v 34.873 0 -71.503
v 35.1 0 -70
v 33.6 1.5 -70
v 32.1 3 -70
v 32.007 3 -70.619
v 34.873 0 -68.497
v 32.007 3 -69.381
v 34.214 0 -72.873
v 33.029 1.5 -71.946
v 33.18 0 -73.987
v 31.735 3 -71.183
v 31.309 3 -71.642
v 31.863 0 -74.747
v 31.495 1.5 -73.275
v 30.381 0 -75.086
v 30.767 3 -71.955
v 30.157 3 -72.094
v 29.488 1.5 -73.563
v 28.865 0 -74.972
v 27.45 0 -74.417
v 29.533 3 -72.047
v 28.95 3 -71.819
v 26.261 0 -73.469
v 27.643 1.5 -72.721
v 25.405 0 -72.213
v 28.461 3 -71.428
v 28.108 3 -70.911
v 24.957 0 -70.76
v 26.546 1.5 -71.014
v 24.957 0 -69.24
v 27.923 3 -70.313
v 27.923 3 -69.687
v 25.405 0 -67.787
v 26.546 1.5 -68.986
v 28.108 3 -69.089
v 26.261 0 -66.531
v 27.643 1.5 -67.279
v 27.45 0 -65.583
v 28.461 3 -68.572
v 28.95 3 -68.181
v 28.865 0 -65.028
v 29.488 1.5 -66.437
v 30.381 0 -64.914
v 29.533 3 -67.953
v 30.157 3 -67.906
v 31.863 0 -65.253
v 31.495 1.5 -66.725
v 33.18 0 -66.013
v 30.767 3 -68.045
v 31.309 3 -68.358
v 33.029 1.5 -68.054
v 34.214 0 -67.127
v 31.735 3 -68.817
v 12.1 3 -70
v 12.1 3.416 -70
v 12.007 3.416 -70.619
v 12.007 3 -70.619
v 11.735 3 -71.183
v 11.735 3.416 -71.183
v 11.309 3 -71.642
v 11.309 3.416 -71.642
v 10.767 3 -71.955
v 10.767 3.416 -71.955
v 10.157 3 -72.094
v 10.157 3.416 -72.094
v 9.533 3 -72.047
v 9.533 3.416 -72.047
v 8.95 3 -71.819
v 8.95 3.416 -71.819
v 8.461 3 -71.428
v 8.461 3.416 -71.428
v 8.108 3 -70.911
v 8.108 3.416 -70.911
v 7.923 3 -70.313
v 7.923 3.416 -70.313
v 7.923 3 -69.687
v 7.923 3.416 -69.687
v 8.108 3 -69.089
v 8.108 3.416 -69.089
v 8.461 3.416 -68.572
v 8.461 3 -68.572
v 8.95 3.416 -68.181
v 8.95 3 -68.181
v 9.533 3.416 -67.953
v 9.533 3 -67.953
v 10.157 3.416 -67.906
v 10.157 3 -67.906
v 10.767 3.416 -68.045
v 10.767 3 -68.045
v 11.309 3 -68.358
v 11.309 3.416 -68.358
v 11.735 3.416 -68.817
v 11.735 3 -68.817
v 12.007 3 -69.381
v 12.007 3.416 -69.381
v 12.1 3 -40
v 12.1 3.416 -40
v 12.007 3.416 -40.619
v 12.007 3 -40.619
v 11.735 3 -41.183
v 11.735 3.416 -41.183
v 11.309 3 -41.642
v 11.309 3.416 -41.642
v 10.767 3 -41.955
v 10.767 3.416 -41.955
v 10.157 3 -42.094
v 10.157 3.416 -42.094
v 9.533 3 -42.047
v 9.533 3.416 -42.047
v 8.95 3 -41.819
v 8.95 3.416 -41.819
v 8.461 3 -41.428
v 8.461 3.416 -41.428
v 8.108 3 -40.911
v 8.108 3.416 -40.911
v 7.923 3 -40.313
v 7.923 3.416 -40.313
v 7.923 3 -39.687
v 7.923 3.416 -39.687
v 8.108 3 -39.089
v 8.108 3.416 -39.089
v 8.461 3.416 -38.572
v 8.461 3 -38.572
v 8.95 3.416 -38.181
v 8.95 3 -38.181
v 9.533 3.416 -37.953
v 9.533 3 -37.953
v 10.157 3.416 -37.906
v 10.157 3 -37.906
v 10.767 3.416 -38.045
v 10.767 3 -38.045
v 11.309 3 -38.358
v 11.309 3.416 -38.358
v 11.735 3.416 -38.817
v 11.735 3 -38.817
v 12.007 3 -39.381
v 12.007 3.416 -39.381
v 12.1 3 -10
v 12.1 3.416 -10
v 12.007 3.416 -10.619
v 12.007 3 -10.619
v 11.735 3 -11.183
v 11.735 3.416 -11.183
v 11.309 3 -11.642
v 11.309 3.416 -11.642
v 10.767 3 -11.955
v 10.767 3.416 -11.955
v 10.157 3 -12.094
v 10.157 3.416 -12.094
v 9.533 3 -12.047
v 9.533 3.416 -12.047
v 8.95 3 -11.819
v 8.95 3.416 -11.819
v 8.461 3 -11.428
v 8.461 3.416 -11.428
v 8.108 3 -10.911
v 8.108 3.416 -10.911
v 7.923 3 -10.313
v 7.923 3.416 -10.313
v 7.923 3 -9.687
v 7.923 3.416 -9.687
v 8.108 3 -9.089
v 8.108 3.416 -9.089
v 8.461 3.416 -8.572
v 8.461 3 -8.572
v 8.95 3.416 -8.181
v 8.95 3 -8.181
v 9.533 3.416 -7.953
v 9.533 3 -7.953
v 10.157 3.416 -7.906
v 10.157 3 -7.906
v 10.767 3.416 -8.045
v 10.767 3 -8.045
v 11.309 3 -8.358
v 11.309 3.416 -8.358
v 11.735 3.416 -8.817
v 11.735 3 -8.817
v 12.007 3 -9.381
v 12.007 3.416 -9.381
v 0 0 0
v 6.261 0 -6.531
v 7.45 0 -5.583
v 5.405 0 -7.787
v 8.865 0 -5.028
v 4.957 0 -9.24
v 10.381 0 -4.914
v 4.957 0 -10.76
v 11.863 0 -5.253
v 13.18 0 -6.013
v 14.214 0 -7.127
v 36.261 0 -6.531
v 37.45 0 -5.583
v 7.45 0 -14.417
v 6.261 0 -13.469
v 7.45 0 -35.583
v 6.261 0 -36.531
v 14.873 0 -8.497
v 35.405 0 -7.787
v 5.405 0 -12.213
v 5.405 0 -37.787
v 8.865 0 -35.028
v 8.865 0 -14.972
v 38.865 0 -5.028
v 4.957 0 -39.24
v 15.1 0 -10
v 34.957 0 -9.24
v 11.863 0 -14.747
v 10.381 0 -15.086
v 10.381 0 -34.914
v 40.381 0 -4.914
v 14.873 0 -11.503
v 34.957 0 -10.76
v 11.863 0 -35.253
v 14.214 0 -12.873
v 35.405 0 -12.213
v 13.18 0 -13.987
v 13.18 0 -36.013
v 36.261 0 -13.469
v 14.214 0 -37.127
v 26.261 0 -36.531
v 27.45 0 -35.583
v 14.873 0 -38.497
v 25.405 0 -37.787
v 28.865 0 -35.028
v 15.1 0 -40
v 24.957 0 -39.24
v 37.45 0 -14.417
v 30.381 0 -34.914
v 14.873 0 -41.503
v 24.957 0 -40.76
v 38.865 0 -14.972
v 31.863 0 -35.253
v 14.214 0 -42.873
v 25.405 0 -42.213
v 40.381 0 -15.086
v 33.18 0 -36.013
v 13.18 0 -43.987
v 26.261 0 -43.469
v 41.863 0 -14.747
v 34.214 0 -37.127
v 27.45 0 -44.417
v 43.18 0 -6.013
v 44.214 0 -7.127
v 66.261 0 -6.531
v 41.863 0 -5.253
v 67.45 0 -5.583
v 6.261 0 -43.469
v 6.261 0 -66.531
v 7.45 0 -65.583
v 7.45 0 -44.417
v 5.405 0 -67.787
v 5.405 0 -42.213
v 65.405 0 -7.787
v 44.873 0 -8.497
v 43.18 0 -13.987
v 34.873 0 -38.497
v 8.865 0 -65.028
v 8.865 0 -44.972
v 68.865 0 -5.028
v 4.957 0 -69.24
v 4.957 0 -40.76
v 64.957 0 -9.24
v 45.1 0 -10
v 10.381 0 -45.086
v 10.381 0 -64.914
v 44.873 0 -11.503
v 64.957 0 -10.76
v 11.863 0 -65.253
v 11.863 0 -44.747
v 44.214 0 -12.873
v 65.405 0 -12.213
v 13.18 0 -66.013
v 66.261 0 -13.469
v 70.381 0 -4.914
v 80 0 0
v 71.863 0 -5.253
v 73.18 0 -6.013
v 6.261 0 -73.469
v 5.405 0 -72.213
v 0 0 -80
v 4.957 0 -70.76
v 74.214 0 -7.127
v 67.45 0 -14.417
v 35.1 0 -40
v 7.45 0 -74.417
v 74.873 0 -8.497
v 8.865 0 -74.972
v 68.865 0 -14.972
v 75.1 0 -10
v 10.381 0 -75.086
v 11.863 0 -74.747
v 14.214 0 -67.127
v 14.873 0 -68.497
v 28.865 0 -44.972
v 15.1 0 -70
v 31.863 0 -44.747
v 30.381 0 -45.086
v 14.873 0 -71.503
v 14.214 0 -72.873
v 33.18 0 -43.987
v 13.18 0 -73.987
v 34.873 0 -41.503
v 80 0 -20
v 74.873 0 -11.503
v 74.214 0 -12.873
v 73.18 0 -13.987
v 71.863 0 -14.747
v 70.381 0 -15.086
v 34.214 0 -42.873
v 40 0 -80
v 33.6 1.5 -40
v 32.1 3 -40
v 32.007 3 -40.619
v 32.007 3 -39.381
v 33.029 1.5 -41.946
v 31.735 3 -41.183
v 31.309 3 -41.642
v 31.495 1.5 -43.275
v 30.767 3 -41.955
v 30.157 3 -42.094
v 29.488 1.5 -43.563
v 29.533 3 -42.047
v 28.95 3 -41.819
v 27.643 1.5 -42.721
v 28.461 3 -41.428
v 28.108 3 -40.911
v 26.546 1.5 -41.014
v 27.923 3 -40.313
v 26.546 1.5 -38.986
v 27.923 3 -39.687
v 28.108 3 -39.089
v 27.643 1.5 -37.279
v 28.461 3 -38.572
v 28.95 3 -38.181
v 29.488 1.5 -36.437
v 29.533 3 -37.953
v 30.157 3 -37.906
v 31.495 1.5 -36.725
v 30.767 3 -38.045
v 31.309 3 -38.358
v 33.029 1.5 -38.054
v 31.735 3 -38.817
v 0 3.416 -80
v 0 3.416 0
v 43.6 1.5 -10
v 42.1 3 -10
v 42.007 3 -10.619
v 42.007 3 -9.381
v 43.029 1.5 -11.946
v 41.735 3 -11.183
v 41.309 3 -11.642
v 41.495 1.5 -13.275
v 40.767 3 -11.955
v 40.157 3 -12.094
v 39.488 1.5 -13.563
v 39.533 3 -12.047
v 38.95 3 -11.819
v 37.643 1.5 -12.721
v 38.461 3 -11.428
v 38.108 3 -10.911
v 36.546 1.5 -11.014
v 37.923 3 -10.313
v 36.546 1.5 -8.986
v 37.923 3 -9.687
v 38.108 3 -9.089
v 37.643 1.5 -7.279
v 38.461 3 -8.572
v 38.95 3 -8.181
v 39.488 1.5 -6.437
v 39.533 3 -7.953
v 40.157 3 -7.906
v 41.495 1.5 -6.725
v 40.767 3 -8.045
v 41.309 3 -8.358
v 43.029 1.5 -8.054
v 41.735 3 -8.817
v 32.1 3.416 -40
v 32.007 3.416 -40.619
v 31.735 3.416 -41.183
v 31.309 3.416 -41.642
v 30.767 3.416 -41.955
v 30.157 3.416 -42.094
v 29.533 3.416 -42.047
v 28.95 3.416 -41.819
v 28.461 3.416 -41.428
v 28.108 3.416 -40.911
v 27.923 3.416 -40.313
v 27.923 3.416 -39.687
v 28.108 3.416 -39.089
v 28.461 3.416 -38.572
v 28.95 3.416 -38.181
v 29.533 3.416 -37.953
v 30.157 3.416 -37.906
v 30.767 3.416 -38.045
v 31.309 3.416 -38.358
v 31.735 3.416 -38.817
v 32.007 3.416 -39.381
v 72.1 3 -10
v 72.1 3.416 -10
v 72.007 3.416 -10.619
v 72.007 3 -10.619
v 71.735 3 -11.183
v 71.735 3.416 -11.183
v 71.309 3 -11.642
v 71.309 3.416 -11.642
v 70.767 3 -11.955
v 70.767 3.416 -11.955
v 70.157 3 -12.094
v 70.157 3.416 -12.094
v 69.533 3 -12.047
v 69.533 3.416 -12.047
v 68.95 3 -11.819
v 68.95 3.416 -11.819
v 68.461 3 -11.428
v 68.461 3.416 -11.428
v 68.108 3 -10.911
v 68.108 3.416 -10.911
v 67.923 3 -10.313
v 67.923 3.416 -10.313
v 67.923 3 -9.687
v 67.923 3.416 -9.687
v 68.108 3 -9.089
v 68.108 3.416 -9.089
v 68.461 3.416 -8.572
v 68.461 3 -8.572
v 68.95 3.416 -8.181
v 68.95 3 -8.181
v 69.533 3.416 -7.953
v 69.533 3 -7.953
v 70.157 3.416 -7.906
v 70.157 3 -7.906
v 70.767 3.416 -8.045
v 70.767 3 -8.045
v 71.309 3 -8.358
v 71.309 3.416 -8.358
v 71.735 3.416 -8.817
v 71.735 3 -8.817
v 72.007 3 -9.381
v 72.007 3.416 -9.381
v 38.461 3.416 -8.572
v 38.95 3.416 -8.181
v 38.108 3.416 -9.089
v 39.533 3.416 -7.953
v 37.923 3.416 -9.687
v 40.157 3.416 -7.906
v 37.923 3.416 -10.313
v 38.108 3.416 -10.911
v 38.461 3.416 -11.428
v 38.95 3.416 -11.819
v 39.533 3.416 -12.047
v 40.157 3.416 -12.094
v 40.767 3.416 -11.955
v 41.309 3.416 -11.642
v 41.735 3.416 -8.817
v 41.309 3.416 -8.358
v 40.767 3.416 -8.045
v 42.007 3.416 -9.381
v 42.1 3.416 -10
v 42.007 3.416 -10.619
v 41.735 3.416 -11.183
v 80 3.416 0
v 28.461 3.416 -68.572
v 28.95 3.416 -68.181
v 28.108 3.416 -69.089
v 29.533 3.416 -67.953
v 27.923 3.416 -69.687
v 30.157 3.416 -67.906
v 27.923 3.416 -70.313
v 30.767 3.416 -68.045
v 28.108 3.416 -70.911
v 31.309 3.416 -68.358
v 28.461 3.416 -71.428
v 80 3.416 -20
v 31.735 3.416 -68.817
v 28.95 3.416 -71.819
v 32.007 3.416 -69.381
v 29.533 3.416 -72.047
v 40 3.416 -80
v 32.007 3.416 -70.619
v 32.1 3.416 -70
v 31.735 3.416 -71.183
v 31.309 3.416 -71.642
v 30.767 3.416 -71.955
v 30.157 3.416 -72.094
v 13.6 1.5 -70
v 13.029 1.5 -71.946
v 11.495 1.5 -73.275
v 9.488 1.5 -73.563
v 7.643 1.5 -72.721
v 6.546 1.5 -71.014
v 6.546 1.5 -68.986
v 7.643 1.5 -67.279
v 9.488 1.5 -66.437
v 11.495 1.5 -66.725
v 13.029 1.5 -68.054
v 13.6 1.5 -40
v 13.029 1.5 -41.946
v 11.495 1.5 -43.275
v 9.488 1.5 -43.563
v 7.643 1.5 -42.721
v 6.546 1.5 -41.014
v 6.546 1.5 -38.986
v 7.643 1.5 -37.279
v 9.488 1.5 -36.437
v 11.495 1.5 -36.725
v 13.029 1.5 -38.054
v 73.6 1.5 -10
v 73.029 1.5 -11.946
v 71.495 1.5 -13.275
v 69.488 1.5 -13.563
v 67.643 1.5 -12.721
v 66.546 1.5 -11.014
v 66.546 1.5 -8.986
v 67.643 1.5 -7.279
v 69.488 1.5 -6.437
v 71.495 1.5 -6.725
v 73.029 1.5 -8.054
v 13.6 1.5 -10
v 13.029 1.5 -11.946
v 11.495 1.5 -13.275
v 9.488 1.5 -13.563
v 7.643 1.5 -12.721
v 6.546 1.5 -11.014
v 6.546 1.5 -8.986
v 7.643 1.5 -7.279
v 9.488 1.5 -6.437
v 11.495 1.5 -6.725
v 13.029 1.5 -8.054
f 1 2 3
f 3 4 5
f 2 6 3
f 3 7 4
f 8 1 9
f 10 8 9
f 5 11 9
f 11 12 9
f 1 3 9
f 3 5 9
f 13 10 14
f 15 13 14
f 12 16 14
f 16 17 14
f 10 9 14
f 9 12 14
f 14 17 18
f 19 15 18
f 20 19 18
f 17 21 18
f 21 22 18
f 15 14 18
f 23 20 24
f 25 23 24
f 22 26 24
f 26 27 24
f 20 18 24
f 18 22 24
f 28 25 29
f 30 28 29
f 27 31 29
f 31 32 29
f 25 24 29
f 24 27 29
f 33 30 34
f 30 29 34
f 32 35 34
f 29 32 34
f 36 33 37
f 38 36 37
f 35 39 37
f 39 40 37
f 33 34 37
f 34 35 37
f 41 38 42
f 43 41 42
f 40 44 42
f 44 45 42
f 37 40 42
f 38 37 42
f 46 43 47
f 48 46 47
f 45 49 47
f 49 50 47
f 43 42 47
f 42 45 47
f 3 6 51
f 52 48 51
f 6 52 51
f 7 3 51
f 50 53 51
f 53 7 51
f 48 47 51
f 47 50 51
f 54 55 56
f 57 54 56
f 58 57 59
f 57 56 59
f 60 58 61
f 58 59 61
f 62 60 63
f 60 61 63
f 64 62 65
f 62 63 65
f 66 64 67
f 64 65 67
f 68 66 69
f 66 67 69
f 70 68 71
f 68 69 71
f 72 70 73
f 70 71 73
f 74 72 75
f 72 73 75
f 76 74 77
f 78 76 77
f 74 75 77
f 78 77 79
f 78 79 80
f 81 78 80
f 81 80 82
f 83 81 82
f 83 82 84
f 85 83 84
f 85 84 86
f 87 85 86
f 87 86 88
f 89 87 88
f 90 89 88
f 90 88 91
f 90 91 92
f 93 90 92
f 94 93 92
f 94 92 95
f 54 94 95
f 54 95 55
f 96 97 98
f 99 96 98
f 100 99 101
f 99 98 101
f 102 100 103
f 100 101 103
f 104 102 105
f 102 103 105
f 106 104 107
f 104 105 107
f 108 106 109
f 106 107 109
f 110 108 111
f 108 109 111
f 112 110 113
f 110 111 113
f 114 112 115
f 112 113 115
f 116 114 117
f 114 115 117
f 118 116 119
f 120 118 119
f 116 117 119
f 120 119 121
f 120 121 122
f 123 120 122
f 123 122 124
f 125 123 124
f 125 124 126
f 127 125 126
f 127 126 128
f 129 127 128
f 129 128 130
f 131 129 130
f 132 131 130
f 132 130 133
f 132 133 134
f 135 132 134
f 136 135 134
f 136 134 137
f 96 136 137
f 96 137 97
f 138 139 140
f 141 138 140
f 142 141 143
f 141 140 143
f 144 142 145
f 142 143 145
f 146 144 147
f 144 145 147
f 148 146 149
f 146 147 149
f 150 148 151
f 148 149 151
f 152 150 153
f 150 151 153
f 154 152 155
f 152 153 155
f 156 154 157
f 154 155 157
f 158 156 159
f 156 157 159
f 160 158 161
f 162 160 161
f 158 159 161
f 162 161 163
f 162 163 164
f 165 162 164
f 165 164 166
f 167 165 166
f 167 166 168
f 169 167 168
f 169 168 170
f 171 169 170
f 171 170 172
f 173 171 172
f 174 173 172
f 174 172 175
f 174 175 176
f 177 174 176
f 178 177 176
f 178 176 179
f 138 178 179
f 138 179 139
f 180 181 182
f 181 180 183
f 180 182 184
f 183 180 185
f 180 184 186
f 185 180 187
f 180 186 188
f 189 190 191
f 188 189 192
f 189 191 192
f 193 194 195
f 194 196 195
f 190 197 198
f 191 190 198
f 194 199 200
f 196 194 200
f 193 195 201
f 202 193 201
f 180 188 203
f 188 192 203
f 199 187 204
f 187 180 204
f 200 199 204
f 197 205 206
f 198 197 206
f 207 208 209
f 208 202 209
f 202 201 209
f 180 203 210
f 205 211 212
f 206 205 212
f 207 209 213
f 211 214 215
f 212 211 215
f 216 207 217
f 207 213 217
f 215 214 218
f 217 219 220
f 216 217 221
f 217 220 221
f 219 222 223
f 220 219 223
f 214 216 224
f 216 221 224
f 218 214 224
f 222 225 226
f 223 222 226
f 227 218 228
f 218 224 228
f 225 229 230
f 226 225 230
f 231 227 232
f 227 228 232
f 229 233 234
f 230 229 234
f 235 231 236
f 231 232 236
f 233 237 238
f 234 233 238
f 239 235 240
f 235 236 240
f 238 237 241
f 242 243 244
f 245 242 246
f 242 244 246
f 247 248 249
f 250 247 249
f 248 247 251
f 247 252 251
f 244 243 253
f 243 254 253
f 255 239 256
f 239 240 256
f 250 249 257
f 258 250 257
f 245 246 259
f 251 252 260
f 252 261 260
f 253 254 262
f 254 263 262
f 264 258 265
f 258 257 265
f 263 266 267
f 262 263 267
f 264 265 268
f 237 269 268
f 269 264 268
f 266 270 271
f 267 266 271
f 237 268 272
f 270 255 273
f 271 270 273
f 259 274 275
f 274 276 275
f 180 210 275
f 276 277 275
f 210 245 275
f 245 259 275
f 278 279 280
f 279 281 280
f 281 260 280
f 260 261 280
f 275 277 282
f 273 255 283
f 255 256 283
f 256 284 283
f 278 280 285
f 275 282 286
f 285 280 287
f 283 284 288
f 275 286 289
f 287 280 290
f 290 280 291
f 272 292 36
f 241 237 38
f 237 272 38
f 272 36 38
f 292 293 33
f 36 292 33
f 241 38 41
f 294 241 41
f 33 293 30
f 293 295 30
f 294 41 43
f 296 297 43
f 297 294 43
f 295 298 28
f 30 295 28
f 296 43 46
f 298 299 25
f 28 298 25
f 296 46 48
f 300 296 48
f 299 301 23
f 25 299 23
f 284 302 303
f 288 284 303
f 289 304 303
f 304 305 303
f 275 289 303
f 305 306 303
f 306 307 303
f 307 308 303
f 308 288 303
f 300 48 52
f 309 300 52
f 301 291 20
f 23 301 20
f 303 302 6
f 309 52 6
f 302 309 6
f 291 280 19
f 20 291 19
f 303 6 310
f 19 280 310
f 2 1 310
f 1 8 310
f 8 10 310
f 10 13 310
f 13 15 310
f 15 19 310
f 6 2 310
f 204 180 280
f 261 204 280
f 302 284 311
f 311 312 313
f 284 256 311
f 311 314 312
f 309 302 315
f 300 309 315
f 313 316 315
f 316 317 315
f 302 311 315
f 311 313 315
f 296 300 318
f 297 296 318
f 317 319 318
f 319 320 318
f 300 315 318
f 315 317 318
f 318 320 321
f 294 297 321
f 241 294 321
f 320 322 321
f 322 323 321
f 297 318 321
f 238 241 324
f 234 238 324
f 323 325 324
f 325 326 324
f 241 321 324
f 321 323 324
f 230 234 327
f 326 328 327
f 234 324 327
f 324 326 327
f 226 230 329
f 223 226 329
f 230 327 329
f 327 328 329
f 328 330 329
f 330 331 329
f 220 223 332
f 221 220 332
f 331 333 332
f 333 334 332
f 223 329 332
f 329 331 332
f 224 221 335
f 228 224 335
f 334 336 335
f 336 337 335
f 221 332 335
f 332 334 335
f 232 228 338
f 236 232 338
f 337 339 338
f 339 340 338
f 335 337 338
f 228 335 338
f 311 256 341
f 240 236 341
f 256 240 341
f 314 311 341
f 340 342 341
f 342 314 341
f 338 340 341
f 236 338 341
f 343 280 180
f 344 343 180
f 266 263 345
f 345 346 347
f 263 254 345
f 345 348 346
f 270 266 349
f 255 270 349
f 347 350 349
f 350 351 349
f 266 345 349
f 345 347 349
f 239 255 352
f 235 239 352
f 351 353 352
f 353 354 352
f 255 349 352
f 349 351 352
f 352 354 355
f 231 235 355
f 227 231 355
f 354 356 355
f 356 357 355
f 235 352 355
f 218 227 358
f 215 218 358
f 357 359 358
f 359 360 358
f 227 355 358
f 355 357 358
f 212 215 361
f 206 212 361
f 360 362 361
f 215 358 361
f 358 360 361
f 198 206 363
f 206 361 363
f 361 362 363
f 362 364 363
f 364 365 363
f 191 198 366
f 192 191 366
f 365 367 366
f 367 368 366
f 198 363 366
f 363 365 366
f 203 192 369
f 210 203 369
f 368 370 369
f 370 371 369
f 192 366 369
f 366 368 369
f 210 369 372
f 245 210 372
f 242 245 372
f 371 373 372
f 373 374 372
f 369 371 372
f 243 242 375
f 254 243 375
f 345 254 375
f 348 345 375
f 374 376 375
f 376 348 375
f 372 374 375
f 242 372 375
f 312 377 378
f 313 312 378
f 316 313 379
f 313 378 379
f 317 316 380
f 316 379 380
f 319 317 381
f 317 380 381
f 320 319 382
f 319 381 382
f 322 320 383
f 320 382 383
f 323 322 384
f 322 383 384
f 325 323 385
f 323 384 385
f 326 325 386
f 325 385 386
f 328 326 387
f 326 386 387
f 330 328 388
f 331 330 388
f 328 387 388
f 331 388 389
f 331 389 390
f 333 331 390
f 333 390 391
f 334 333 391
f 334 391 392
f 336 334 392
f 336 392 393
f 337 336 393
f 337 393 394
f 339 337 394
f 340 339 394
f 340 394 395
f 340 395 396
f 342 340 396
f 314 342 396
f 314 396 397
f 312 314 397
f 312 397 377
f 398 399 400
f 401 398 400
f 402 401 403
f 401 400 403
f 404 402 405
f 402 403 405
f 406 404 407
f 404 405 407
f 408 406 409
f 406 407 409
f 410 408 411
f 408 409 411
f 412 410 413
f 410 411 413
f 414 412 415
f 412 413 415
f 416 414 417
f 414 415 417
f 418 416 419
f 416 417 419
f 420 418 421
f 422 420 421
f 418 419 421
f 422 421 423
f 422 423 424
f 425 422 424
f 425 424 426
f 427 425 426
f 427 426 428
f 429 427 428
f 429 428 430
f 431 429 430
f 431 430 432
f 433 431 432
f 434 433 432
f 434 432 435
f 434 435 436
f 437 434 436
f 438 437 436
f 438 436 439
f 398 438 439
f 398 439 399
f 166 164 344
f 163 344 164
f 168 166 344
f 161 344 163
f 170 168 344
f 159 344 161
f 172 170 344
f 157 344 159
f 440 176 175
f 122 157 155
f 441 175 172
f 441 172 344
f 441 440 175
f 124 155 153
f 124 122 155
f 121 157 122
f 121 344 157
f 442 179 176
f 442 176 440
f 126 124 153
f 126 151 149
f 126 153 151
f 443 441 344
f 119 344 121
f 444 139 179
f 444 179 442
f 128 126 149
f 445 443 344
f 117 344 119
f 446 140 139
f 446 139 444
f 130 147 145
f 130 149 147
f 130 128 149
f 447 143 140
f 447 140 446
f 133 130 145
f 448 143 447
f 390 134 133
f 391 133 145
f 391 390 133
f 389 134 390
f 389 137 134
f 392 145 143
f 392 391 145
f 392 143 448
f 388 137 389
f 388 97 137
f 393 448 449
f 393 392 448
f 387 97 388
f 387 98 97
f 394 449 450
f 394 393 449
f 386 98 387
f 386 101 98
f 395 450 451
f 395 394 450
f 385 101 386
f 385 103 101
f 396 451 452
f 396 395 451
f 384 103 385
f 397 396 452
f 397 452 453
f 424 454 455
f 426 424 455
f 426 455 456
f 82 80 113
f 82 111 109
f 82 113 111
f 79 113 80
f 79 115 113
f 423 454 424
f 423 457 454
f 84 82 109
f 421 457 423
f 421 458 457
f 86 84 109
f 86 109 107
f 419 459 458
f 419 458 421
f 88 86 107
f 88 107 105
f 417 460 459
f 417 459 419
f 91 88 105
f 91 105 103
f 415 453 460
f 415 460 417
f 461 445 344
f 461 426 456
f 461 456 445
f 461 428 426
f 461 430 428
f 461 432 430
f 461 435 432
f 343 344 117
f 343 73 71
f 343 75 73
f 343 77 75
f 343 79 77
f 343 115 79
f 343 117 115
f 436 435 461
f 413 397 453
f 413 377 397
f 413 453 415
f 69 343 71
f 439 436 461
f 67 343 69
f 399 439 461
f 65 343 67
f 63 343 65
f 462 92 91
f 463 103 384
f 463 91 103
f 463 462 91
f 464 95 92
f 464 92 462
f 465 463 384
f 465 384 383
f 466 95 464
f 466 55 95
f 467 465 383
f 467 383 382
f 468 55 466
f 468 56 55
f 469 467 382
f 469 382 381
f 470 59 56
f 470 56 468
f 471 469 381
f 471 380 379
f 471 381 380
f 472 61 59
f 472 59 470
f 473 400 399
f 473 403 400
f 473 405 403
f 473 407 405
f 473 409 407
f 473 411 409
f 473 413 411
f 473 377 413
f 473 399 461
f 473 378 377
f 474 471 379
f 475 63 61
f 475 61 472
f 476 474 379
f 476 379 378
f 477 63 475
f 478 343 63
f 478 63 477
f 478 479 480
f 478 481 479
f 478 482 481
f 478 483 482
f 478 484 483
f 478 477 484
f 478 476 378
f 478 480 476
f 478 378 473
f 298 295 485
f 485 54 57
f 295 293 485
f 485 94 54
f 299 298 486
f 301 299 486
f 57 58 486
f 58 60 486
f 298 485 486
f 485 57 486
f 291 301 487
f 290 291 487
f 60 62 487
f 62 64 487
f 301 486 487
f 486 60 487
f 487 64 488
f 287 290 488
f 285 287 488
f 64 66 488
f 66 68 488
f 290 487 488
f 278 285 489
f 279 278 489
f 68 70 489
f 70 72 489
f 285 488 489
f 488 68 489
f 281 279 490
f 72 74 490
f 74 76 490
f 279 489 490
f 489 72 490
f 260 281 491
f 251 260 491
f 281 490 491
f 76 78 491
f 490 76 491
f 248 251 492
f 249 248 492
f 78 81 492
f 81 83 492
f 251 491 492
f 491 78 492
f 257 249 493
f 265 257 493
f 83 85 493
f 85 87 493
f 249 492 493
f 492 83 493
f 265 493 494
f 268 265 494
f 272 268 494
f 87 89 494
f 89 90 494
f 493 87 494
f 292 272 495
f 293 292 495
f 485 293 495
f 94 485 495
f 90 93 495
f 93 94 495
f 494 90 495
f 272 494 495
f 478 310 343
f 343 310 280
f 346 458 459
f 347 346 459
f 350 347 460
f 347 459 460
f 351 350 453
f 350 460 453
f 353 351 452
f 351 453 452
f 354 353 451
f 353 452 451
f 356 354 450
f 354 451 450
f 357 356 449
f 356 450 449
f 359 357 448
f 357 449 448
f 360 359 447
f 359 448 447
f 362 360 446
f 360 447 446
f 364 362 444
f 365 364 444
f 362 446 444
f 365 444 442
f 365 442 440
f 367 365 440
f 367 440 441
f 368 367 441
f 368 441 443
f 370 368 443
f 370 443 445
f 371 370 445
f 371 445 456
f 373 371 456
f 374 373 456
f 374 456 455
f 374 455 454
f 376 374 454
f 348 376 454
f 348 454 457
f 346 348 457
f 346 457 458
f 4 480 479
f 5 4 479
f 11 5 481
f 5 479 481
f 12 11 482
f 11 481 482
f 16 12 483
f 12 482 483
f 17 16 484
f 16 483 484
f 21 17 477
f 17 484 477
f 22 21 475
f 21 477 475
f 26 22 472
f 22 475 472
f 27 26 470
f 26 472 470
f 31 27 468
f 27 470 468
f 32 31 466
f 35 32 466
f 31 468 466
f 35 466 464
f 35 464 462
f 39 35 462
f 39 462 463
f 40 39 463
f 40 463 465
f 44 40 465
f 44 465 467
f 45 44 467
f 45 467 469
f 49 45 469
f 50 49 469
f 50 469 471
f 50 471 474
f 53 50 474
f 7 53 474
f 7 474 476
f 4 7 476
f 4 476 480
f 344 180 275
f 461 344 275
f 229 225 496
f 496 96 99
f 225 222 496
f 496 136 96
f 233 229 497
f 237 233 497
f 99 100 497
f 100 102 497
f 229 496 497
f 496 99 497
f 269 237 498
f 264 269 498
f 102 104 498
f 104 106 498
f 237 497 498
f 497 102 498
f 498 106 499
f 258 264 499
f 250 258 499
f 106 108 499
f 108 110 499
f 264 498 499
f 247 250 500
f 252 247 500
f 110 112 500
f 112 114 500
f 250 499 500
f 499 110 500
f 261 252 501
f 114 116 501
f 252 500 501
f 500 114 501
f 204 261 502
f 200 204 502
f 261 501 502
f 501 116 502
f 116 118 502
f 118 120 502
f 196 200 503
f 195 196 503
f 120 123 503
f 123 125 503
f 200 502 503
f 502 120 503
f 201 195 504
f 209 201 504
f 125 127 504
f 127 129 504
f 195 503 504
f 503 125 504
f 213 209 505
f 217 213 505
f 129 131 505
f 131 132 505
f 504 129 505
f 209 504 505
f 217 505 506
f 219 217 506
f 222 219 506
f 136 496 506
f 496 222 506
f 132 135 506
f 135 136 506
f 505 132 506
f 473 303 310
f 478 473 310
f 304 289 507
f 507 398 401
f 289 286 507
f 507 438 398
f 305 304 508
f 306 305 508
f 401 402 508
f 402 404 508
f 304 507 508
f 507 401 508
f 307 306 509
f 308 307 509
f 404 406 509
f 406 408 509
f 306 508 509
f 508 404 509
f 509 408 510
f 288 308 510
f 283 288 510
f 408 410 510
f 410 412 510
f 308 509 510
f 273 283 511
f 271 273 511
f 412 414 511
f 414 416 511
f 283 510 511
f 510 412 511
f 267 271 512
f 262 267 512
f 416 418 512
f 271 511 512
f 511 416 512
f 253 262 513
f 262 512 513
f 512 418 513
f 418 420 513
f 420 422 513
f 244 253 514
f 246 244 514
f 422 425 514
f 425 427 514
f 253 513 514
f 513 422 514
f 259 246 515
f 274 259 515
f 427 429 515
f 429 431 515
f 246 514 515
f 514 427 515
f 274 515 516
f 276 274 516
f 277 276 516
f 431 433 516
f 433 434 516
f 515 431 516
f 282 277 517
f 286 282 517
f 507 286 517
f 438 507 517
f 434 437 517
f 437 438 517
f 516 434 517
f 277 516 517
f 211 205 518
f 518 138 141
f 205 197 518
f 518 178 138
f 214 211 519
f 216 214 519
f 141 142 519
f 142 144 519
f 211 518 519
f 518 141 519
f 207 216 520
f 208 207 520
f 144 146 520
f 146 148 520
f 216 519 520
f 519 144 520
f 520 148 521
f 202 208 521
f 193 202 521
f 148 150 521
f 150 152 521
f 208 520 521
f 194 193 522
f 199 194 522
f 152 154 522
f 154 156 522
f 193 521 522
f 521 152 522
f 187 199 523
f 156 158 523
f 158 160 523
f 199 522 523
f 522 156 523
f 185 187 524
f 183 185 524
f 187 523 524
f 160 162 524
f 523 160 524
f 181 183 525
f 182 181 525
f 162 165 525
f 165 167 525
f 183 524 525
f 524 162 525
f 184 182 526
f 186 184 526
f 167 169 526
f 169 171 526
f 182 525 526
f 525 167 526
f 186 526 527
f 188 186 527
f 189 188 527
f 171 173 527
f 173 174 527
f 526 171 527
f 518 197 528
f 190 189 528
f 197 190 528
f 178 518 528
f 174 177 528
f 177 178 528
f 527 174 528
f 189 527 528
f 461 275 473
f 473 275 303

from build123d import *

# Parameters (mm, degrees)
BOSS_EXTRUDE1_DEPTH = 3.416
SKETCH2_R           = 2.1
CUT_EXTRUDE1_DEPTH  = 4
CHAMFER1_SIZE       = 3


with BuildPart() as part:
    # Sketch1 → Boss-Extrude1 (new body)
    with BuildSketch(Plane(origin=(0, 0, 0), x_dir=(1, 0, 0), z_dir=(0, 1, 0))):
        Polygon((0, 0), (80, 0), (80, 20), (40, 80), (0, 80), align=None)
    extrude(amount=BOSS_EXTRUDE1_DEPTH)

    # Sketch2 → Cut-Extrude1 (cut)
    with BuildSketch(Plane(origin=(0, 3.416, 0), x_dir=(1, 0, 0), z_dir=(0, 1, 0))):
        with Locations((10, 10)):
            Circle(SKETCH2_R)
        with Locations((40, 10)):
            Circle(SKETCH2_R)
        with Locations((70, 10)):
            Circle(SKETCH2_R)
        with Locations((30, 40)):
            Circle(SKETCH2_R)
        with Locations((30, 70)):
            Circle(SKETCH2_R)
        with Locations((10, 40)):
            Circle(SKETCH2_R)
        with Locations((10, 70)):
            Circle(SKETCH2_R)
    extrude(amount=-CUT_EXTRUDE1_DEPTH, mode=Mode.SUBTRACT)

    # Chamfer1
    chamfer1_edges = [part.edges().sort_by_distance(p)[0] for p in [
        (7.9, 0, -70),
        (7.9, 0, -40),
        (27.9, 0, -70),
        (27.9, 0, -40),
        (67.9, 0, -10),
        (37.9, 0, -10),
        (7.9, 0, -10),
    ]]
    chamfer(chamfer1_edges, length=CHAMFER1_SIZE)


solid = part.part
